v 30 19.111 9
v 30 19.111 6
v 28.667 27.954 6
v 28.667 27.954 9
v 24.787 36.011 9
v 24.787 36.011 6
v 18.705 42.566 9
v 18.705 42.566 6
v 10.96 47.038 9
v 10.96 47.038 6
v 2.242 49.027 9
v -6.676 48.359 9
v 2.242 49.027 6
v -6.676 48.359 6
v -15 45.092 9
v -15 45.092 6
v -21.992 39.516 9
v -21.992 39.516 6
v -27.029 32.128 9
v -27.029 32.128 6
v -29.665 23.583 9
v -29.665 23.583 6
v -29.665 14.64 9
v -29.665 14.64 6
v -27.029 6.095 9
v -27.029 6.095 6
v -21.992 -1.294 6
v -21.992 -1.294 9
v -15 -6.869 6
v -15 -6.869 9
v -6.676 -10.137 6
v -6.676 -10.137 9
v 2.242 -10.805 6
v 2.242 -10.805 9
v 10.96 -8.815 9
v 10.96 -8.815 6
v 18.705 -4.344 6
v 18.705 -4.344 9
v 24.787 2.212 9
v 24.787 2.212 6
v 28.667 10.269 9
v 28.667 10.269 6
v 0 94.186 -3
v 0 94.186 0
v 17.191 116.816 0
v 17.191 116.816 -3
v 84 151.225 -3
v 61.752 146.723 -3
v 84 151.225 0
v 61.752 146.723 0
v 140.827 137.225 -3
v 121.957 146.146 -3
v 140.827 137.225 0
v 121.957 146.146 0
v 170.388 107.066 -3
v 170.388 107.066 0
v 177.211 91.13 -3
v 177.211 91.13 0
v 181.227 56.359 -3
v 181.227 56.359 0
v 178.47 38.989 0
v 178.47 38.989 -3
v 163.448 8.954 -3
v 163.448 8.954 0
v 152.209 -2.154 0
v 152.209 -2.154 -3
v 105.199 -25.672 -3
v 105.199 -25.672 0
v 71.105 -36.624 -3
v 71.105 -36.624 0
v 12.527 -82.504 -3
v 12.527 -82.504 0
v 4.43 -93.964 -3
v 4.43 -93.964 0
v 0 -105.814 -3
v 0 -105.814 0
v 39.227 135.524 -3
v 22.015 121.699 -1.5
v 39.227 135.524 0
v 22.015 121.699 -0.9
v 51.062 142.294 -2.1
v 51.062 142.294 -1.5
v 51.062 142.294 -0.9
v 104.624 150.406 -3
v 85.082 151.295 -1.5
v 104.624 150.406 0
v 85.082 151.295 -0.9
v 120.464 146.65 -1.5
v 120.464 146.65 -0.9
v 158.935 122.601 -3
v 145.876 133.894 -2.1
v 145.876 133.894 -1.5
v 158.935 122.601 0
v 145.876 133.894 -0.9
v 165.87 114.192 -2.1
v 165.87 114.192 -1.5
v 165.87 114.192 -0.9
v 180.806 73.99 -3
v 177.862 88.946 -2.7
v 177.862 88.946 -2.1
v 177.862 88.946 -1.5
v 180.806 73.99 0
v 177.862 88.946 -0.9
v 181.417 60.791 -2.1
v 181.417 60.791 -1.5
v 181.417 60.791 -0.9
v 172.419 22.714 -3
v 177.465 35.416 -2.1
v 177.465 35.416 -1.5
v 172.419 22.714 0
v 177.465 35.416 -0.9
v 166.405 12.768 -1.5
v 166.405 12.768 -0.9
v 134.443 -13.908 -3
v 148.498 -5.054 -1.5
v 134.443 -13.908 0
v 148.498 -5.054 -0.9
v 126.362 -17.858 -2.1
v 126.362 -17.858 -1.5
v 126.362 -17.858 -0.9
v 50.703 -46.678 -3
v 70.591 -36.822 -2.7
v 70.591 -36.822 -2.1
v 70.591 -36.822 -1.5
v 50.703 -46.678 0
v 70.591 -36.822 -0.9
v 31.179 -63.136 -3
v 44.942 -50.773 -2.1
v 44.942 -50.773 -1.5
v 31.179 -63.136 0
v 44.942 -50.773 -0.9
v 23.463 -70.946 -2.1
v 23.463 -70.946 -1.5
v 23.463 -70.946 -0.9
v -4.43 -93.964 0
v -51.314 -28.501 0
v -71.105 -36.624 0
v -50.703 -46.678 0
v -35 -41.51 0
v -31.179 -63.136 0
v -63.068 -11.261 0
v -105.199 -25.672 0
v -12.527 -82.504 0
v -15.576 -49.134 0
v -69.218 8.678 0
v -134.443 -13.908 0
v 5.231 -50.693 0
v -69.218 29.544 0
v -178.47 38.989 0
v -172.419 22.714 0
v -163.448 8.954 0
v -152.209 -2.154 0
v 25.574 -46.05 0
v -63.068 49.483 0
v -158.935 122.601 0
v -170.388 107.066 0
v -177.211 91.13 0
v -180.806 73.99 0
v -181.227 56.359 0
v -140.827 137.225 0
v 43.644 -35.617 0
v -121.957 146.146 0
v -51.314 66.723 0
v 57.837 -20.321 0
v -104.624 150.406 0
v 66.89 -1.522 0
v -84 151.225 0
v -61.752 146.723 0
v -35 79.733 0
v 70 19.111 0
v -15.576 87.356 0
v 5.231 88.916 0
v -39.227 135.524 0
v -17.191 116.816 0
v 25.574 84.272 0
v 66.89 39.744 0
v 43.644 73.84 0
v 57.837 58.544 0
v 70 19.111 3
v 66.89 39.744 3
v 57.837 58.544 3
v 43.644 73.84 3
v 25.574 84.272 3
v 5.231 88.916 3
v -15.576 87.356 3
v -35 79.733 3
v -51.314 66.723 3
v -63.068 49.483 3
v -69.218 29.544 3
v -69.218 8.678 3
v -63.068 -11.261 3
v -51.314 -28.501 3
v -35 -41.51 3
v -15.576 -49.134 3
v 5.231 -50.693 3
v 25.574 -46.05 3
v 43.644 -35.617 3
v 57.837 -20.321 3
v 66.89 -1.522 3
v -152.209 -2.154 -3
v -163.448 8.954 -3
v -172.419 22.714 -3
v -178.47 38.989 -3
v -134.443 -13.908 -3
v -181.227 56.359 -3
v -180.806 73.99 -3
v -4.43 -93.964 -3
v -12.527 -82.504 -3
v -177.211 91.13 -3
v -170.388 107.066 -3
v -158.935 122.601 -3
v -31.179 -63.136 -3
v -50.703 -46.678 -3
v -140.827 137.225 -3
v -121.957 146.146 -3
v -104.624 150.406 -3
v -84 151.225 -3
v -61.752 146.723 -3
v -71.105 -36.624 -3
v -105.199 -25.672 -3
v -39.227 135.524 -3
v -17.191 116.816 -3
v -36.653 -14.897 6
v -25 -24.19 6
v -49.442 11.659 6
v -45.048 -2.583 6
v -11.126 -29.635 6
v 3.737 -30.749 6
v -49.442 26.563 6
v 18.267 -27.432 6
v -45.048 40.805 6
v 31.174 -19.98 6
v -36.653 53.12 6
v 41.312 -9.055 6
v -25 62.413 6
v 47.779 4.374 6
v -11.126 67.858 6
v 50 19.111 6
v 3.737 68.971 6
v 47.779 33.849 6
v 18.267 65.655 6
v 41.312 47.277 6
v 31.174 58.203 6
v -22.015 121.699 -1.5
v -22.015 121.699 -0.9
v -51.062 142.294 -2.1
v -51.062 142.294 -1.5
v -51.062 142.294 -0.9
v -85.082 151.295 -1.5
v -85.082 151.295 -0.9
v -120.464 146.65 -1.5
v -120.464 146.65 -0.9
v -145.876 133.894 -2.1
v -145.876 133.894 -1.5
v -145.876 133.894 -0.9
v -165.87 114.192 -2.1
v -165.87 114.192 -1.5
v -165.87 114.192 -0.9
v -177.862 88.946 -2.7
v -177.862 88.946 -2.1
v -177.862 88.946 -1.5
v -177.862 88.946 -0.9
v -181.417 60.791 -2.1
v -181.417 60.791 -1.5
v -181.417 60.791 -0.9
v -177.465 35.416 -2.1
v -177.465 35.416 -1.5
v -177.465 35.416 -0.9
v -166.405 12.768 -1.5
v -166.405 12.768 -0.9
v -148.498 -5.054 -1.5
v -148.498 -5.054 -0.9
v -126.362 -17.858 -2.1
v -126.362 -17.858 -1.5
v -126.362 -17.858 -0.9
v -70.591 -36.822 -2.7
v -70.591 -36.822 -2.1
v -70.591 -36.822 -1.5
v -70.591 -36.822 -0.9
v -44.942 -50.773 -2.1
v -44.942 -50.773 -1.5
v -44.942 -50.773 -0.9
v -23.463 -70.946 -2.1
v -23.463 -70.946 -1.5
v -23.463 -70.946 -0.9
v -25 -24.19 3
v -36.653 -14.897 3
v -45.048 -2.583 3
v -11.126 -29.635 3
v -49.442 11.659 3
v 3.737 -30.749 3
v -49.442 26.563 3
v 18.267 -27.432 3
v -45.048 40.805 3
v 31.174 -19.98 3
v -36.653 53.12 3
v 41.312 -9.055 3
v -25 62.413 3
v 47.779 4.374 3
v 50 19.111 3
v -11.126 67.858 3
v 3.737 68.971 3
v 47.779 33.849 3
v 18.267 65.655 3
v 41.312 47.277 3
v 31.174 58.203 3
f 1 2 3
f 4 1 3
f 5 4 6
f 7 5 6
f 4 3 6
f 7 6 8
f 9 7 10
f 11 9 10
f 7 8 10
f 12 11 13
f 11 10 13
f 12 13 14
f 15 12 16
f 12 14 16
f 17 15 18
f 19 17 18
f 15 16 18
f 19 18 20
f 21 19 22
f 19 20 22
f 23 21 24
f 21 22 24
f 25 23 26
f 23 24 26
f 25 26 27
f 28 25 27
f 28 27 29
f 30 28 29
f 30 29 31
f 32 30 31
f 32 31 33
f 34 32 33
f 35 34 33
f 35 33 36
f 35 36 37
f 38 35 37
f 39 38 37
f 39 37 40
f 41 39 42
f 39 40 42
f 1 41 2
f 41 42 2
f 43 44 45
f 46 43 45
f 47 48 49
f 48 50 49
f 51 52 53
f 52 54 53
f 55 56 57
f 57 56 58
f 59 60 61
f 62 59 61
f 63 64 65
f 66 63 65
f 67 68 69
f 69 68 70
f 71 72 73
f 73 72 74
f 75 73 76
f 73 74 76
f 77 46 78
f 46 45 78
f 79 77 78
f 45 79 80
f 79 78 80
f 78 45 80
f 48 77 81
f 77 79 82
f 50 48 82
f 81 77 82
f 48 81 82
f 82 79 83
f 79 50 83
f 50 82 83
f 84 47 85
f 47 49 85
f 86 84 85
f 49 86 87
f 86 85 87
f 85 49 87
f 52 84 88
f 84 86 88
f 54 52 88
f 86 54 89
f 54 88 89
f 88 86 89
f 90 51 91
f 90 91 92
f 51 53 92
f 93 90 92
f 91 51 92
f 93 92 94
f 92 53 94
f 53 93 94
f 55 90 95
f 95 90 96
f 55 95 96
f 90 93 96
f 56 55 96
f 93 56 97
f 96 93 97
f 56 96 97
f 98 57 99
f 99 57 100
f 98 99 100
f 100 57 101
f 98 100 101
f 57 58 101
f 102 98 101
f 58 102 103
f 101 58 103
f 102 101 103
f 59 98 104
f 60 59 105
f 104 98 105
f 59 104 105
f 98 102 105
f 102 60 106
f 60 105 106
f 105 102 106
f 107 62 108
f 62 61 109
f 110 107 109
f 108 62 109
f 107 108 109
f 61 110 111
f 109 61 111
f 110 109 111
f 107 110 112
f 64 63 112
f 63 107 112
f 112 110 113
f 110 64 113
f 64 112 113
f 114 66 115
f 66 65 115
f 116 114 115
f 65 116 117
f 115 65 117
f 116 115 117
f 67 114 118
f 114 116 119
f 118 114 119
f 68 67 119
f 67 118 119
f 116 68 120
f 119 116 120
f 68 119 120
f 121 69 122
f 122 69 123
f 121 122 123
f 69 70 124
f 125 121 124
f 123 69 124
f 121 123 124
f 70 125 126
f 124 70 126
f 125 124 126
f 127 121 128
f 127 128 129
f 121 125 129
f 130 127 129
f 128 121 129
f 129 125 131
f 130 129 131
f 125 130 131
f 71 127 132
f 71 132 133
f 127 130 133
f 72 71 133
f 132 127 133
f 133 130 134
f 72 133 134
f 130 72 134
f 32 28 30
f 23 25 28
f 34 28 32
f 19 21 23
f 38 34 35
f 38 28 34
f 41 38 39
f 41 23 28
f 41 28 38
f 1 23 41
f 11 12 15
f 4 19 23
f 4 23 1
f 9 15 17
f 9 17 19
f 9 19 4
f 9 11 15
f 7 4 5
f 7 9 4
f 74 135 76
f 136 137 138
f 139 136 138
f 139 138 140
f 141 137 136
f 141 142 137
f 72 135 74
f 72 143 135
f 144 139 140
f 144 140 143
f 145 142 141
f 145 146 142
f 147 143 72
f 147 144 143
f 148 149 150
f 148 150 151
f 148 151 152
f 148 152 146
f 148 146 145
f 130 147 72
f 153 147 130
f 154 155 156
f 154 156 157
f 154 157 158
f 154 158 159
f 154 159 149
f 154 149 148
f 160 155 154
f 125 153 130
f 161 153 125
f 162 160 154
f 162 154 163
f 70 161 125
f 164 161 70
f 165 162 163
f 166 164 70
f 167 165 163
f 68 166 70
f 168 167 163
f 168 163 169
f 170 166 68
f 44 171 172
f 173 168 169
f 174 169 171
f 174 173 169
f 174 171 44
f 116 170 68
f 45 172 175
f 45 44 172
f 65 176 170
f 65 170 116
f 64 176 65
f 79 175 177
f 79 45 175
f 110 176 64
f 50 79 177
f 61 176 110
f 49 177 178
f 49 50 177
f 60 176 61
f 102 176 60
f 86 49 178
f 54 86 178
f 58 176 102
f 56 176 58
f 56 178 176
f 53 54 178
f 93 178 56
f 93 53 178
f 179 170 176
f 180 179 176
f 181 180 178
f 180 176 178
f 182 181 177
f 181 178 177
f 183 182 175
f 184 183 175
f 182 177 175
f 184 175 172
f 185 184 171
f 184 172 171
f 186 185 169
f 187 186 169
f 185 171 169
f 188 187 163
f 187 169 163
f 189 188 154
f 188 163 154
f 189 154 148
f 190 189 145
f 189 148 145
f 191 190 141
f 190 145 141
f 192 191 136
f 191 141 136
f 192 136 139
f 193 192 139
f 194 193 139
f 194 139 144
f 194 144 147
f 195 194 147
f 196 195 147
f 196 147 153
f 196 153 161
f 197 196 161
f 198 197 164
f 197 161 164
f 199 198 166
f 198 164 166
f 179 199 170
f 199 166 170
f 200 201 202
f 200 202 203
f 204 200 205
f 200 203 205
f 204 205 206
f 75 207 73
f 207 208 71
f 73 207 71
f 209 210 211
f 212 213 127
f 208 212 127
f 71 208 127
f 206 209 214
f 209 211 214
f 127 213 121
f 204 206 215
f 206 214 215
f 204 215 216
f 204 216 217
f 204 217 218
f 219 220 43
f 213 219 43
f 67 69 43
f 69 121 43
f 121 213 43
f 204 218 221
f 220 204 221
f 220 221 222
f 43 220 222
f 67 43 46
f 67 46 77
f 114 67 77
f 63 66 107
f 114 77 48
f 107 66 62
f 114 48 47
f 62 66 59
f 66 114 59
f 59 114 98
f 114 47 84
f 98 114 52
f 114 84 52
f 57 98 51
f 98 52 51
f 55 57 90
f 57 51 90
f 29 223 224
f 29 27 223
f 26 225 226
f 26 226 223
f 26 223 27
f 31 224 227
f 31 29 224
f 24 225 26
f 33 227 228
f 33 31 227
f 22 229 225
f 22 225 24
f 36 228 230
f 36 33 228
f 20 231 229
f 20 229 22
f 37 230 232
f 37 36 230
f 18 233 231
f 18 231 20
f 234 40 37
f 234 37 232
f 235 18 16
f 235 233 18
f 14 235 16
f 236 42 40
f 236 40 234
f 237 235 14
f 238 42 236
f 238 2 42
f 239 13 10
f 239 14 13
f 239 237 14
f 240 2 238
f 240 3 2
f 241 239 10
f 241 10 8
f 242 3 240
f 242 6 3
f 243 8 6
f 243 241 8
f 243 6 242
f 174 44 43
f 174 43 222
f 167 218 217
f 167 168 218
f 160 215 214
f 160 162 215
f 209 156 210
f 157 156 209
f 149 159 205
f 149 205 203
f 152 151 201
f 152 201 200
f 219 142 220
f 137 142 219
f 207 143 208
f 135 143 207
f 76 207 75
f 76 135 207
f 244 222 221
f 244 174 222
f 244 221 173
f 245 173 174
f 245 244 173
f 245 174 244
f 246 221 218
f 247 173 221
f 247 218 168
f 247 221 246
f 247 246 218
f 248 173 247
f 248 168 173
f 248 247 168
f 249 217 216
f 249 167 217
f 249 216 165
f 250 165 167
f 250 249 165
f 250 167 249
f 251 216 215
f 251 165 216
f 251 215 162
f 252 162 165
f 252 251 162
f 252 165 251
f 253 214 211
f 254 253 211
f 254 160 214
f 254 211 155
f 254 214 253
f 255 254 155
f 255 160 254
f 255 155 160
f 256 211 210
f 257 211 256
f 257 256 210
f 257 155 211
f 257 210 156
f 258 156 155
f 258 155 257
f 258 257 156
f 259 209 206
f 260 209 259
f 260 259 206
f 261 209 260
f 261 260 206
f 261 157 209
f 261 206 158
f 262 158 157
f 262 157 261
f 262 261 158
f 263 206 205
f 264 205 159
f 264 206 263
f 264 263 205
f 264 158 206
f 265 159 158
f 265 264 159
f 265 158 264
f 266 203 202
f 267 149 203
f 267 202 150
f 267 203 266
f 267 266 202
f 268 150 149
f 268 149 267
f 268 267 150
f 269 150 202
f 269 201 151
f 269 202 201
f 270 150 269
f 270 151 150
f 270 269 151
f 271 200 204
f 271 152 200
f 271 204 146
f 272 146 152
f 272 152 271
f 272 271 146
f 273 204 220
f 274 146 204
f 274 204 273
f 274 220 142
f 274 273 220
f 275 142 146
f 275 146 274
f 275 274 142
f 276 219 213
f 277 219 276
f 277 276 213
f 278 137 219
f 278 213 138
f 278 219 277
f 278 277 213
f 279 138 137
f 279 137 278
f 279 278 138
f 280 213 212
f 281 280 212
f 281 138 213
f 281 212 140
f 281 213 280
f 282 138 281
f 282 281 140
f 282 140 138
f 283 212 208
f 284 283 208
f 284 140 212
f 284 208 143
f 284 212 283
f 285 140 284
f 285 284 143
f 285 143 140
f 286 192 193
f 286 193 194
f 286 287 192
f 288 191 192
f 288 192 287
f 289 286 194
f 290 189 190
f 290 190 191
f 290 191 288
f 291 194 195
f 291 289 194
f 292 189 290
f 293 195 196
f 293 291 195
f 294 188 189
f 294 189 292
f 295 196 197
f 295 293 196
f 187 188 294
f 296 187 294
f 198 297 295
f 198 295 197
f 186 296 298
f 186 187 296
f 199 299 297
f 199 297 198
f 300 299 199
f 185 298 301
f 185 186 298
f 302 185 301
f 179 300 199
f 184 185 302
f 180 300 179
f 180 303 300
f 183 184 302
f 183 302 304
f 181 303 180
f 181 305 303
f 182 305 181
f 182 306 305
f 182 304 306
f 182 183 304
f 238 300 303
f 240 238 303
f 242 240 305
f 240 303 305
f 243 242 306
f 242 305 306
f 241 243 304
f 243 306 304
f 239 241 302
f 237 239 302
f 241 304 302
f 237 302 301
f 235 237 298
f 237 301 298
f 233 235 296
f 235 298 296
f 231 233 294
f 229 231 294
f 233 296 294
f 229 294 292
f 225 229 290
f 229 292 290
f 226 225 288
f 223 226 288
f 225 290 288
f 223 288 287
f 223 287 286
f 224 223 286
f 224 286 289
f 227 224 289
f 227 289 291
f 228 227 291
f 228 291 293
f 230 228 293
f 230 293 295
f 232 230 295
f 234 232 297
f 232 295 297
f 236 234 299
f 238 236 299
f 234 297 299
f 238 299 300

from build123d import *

# Parameters (mm, degrees)
BOSS_EXTRUDE2_DEPTH = 3
SKETCH4_R           = 70
BOSS_EXTRUDE3_DEPTH = 3
SKETCH6_R           = 50
BOSS_EXTRUDE4_DEPTH = 3
SKETCH7_R           = 30
BOSS_EXTRUDE5_DEPTH = 3


with BuildPart() as part:
    # Sketch3 → Boss-Extrude2 (new body)
    with BuildSketch(Plane.XY):
        with BuildLine():
            add(Edge.make_bspline(
                [(0, 94.186026498), (-14.937197001, 118.791774845), (-53.837629132, 154.385235119), (-123.714536571, 151.359453215), (-172.01966834, 117.463223927), (-186.123135767, 62.237600369), (-171.600514001, 9.539213873), (-129.602182184, -19.467929152), (-86.914362999, -30.595739372), (-49.13470838, -44.205541663), (-21.929171112, -72.883121261), (-3.141383744, -91.131398202), (0, -105.813973502)],
                knots=[0, 0, 0, 0, 0.172688092, 0.274912245, 0.387287087, 0.492001033, 0.588134212, 0.688255243, 0.771841292, 0.848466196, 0.917182163, 1, 1, 1, 1], degree=3))
            add(Edge.make_bspline(
                [(0, 94.186026498), (14.937197001, 118.791774845), (53.837629132, 154.385235119), (123.714536571, 151.359453215), (172.01966834, 117.463223927), (186.123135767, 62.237600369), (171.600514001, 9.539213873), (129.602182184, -19.467929152), (86.914362999, -30.595739372), (49.13470838, -44.205541663), (21.929171112, -72.883121261), (3.141383744, -91.131398202), (0, -105.813973502)],
                knots=[0, 0, 0, 0, 0.172688092, 0.274912245, 0.387287087, 0.492001033, 0.588134212, 0.688255243, 0.771841292, 0.848466196, 0.917182163, 1, 1, 1, 1], degree=3))
        make_face()
    extrude(amount=-BOSS_EXTRUDE2_DEPTH)

    # Sketch4 → Boss-Extrude3 (add)
    with BuildSketch(Plane.XY):
        with Locations((0, 19.111309062)):
            Circle(SKETCH4_R)
    extrude(amount=BOSS_EXTRUDE3_DEPTH)

    # Sketch6 → Boss-Extrude4 (add)
    with BuildSketch(Plane.XY.offset(3)):
        with Locations((0, 19.111309062)):
            Circle(SKETCH6_R)
    extrude(amount=BOSS_EXTRUDE4_DEPTH)

    # Sketch7 → Boss-Extrude5 (add)
    with BuildSketch(Plane.XY.offset(6)):
        with Locations((0, 19.111309062)):
            Circle(SKETCH7_R)
    extrude(amount=BOSS_EXTRUDE5_DEPTH)


solid = part.part
